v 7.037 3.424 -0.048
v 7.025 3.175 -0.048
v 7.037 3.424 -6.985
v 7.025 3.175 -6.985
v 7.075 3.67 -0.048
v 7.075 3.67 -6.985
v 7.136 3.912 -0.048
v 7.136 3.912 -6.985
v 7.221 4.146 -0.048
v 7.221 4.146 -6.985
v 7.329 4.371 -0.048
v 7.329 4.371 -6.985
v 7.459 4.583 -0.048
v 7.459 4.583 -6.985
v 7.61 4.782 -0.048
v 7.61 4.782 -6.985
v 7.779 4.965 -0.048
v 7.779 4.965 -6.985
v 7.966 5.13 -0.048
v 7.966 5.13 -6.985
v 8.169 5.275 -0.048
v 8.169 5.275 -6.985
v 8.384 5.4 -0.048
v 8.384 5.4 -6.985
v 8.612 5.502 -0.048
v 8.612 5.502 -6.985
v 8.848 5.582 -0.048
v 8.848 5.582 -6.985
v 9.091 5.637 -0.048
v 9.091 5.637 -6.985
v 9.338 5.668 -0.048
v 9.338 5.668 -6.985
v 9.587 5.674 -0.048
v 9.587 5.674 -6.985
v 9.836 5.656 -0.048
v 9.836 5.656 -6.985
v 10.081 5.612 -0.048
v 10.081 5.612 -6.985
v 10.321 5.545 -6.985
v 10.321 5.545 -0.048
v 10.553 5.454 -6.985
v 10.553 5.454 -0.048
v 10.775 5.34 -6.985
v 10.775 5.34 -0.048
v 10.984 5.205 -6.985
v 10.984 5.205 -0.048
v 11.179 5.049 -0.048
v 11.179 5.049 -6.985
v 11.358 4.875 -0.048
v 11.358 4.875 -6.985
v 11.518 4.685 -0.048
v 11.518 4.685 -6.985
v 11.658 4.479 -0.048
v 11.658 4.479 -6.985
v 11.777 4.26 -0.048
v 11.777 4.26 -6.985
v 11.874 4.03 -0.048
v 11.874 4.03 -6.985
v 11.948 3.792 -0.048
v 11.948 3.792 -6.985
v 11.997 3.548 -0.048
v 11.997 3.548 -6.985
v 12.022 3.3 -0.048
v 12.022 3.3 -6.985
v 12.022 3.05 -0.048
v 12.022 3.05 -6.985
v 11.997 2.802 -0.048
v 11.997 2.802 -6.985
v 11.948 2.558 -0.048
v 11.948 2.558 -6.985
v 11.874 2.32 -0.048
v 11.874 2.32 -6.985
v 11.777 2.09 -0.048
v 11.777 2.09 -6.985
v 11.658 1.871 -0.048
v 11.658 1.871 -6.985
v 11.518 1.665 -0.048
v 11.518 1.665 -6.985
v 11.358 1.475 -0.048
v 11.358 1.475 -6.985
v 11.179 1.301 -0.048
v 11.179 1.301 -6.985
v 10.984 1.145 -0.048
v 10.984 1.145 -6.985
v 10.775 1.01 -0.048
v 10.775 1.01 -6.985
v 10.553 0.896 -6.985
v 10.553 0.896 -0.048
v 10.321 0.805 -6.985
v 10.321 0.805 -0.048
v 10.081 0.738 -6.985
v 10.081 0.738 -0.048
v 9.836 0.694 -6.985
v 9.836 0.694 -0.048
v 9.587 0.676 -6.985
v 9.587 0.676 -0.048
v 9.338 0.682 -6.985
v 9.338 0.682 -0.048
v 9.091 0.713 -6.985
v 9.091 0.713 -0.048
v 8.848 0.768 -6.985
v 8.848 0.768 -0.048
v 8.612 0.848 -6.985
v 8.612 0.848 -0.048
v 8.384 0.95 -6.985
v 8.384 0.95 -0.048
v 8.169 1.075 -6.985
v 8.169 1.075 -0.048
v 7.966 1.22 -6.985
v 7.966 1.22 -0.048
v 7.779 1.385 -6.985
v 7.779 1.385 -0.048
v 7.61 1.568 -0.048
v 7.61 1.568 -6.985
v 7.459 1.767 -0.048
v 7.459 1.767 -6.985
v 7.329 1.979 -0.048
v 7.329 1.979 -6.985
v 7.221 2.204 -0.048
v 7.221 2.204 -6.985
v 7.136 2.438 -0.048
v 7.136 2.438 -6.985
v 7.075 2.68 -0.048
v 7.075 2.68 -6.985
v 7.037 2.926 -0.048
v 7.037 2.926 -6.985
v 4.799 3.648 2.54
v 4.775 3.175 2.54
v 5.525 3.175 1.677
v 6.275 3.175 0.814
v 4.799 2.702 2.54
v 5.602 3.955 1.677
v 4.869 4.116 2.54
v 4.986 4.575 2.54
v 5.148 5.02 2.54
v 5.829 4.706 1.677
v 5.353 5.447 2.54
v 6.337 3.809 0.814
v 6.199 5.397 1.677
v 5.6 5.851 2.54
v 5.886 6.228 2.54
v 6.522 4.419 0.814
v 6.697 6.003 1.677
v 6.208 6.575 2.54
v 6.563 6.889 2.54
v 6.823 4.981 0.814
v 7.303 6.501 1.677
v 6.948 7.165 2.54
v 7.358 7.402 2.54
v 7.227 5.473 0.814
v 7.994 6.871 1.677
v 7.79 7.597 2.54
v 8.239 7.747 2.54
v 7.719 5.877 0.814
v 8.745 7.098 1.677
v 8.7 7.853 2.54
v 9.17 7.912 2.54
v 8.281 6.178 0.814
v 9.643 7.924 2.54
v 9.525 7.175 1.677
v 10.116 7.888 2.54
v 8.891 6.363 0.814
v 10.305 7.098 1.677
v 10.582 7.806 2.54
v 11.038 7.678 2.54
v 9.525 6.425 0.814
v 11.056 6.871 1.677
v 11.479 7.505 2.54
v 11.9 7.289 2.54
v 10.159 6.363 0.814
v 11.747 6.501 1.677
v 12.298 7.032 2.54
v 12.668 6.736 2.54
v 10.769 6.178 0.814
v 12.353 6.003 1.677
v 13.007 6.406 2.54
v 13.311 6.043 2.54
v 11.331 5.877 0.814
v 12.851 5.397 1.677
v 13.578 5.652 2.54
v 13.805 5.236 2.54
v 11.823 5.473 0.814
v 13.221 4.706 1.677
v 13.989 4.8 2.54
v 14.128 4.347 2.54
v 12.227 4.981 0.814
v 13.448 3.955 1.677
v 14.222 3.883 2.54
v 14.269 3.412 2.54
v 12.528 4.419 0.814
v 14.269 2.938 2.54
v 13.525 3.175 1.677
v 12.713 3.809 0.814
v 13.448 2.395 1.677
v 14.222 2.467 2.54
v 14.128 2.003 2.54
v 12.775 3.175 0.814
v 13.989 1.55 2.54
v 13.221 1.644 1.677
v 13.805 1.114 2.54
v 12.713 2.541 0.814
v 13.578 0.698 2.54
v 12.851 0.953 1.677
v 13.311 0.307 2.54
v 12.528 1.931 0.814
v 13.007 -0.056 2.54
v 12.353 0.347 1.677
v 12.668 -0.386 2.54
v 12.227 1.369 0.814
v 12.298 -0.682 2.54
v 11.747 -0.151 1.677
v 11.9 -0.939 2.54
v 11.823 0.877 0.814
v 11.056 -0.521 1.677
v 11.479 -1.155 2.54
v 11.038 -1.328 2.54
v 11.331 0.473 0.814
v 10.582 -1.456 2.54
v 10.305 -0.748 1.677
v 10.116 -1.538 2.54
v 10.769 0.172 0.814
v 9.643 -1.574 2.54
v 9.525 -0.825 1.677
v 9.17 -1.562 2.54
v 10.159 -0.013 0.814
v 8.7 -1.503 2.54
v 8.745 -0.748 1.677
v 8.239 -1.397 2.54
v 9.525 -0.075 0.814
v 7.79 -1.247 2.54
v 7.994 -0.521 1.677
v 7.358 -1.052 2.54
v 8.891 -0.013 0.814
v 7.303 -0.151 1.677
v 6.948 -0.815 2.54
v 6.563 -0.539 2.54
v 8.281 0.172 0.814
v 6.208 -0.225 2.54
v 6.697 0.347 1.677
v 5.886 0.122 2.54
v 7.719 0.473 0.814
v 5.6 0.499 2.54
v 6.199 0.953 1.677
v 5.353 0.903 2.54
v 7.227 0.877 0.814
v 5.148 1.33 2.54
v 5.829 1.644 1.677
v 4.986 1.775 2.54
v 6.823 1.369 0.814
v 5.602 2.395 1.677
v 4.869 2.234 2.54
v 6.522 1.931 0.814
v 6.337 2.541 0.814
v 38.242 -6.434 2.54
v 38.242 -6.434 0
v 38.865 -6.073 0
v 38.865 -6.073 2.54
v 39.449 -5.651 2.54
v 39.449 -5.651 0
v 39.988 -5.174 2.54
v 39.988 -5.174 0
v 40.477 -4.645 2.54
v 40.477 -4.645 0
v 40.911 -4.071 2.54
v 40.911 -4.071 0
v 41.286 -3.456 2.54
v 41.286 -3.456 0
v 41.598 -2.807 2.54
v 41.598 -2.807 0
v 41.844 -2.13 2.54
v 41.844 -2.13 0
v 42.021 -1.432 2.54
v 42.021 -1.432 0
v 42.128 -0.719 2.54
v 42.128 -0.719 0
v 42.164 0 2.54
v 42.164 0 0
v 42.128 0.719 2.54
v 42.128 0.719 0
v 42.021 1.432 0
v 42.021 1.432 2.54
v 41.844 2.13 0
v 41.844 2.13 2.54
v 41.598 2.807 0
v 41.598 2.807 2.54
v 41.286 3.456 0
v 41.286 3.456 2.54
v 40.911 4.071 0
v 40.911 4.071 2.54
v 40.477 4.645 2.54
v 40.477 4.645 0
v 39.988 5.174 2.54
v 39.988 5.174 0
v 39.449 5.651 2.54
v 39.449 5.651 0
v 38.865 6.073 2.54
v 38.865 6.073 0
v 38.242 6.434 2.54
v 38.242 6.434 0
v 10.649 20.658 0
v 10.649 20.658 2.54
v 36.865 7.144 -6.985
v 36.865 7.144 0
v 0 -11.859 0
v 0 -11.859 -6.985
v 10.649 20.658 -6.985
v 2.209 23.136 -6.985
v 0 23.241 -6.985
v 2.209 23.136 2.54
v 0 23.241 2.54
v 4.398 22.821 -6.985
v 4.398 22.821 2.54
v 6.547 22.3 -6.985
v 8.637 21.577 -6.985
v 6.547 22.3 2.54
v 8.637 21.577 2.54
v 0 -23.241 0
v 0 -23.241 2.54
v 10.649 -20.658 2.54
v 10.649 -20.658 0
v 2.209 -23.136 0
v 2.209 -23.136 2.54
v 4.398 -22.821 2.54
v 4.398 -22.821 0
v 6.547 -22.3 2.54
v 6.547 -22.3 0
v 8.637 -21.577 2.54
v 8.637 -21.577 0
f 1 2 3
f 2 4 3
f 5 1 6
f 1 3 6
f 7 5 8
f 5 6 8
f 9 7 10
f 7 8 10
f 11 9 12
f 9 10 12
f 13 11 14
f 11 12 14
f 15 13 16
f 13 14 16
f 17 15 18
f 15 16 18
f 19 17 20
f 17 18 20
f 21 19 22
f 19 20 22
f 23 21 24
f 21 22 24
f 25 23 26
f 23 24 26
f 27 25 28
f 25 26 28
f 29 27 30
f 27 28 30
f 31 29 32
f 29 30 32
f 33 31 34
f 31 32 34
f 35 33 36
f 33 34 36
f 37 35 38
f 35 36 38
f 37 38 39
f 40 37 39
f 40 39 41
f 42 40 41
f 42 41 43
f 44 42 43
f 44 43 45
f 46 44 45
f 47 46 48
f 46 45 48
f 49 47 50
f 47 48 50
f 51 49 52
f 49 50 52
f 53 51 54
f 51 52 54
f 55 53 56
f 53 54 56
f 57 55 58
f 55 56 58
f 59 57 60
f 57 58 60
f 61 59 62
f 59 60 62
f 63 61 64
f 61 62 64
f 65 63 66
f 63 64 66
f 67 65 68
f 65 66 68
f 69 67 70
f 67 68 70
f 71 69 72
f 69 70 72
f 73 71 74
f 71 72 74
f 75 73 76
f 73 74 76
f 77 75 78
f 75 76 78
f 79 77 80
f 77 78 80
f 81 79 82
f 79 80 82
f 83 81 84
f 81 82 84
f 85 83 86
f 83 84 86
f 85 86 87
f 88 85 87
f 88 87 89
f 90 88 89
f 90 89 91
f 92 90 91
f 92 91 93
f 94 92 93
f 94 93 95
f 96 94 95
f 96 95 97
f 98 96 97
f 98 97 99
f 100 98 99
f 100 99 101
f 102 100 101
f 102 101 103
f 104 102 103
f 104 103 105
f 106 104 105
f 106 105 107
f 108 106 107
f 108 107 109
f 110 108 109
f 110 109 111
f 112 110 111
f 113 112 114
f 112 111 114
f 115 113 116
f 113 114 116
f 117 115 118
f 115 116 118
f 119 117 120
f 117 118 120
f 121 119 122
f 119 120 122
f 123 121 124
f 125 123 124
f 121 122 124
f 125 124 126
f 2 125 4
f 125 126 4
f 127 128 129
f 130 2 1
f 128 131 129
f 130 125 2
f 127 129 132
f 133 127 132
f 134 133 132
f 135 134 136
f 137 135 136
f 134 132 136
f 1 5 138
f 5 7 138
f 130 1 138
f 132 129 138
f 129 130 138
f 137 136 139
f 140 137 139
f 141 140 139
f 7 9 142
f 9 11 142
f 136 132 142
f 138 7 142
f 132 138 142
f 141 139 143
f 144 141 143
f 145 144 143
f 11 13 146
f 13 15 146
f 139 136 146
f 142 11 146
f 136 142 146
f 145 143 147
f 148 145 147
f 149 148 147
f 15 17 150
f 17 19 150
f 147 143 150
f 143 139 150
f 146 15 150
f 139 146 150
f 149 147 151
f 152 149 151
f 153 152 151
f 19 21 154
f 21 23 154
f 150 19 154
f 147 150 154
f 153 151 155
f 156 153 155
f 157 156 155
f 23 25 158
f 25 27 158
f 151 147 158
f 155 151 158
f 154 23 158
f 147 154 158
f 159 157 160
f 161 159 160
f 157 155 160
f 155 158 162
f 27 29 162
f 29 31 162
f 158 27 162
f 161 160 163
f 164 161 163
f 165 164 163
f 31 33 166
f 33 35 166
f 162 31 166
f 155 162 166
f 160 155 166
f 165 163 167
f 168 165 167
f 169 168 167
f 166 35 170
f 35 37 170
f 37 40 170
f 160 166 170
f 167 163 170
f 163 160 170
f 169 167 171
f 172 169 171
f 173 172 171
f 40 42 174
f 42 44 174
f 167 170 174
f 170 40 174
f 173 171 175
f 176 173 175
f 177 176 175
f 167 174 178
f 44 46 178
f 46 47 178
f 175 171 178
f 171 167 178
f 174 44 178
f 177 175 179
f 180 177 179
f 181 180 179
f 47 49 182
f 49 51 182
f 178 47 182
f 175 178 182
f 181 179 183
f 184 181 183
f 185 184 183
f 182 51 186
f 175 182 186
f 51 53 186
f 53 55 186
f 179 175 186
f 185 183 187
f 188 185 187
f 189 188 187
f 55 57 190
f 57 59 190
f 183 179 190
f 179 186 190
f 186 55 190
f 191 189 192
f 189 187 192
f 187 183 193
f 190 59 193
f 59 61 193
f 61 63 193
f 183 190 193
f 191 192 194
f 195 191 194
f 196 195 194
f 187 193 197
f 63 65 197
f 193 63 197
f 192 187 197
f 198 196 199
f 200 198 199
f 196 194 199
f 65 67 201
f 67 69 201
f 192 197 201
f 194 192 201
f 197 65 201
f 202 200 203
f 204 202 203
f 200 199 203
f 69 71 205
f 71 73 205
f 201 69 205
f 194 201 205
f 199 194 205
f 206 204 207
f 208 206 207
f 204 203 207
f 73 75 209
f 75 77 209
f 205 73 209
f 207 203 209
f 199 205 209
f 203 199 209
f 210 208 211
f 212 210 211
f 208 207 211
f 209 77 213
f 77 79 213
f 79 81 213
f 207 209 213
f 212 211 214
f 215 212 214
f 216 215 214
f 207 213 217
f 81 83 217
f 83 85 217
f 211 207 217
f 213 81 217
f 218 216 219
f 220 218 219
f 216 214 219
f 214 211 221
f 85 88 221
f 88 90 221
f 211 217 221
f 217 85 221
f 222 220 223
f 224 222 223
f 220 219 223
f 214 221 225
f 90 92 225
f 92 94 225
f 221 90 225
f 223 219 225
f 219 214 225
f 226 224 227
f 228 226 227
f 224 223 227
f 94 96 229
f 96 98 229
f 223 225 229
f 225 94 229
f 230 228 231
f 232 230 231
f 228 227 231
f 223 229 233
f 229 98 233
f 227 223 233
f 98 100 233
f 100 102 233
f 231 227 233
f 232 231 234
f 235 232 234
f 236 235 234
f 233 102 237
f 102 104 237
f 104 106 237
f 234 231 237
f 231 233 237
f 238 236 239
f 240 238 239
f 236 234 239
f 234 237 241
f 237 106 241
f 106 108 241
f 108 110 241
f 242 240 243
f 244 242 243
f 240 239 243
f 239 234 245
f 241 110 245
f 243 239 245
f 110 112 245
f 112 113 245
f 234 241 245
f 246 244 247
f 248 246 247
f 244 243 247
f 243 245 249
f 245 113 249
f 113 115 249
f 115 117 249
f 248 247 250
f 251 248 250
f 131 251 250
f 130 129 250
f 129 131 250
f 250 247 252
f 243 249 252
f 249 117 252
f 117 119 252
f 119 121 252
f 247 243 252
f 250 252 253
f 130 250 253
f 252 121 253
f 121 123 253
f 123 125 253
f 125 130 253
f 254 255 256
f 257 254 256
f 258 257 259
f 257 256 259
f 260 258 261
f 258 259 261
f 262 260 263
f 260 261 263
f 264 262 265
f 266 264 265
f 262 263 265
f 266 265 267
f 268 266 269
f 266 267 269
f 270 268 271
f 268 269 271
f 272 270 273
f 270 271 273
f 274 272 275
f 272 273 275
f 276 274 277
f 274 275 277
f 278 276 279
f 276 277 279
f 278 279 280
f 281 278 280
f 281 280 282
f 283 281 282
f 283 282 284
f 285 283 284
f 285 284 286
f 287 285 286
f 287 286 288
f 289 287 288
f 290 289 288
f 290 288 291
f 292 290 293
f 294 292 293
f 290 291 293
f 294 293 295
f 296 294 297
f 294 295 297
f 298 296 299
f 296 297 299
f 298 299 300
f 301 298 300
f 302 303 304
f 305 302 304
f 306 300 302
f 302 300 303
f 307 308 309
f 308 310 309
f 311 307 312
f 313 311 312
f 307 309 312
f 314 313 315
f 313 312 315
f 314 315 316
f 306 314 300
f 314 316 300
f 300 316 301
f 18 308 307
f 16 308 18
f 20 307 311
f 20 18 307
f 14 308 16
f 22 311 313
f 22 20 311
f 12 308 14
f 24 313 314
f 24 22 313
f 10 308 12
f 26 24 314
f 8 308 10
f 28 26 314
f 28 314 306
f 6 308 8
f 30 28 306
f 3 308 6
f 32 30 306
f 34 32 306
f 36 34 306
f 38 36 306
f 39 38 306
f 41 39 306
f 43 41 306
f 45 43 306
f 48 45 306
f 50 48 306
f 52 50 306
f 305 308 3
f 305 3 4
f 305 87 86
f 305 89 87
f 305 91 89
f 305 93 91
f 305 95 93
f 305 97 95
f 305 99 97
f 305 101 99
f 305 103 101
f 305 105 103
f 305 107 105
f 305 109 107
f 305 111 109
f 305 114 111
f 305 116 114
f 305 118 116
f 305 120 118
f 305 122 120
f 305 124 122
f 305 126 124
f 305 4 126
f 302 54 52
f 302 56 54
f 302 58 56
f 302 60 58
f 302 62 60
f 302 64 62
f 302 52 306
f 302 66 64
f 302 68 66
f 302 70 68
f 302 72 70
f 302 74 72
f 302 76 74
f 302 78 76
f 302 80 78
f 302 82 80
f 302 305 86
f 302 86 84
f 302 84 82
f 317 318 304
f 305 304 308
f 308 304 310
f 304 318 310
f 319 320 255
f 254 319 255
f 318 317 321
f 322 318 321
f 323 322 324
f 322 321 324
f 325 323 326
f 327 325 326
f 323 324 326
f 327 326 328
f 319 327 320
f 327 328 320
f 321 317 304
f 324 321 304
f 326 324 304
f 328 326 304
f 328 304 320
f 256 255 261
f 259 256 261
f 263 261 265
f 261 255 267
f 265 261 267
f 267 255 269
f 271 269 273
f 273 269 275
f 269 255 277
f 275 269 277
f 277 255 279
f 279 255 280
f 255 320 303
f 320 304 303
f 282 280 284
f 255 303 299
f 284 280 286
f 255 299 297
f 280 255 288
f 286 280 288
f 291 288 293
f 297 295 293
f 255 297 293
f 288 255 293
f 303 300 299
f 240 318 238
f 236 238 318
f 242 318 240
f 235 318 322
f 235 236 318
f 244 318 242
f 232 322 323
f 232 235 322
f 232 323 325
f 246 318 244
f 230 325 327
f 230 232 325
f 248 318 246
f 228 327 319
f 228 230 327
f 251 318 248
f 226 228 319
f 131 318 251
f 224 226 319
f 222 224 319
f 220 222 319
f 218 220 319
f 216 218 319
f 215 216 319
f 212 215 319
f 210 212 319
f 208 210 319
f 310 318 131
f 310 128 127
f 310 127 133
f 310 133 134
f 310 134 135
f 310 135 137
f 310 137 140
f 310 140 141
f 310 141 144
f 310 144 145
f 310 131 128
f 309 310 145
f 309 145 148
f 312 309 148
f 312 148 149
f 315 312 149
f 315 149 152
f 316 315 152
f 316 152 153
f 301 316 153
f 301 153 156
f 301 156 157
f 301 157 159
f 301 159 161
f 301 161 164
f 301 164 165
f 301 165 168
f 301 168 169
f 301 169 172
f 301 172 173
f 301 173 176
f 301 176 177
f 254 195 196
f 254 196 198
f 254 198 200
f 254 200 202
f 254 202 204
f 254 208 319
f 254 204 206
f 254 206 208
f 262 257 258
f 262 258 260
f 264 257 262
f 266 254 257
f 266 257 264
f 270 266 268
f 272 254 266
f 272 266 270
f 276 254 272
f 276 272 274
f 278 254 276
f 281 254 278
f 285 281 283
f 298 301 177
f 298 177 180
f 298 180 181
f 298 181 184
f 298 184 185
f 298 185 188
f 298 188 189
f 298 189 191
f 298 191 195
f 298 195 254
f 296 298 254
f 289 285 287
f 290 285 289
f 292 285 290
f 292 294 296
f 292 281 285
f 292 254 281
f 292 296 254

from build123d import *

# Parameters (mm, degrees)
F1_DEPTH       = 2.54
F3_DEPTH       = 6.985
F5_D           = 5
F5_CSINK_D     = 9.5
F5_CSINK_ANGLE = 82


with BuildPart() as f1:
    # F0 (on Top) → F1 (new body)
    with BuildSketch(Plane.XY):
        with BuildLine():
            ThreePointArc((10.648604, 20.65796), (5.478705, 22.58601), (0, 23.241))
            Line((0, 23.241), (0, -23.241))
            ThreePointArc((0, -23.241), (5.478705, -22.58601), (10.648604, -20.65796))
            Line((10.648604, -20.65796), (38.241778, -6.434447))
            ThreePointArc((38.241778, -6.434447), (42.164, 0), (38.241778, 6.434447))
            Line((38.241778, 6.434447), (10.648604, 20.65796))
        make_face()
    extrude(amount=F1_DEPTH)

    # F2 (on face) → F3 (join)
    with BuildSketch(Plane(origin=(0, 0, 0), x_dir=(1, 0, 0), z_dir=(0, 0, -1))):
        with BuildLine():
            Line((36.865278, -7.143994), (0, 11.859031))
            Line((0, 11.859031), (0, -23.241))
            ThreePointArc((0, -23.241), (5.478705, -22.58601), (10.648604, -20.65796))
            Line((10.648604, -20.65796), (36.865278, -7.143994))
        make_face()
    extrude(amount=F3_DEPTH)

    # F5 (through all)
    with Locations(Plane.XY.offset(2.54)):
        with Locations((9.525, 3.175)):
            CounterSinkHole(F5_D / 2, F5_CSINK_D / 2, counter_sink_angle=F5_CSINK_ANGLE)


solid = f1.part
